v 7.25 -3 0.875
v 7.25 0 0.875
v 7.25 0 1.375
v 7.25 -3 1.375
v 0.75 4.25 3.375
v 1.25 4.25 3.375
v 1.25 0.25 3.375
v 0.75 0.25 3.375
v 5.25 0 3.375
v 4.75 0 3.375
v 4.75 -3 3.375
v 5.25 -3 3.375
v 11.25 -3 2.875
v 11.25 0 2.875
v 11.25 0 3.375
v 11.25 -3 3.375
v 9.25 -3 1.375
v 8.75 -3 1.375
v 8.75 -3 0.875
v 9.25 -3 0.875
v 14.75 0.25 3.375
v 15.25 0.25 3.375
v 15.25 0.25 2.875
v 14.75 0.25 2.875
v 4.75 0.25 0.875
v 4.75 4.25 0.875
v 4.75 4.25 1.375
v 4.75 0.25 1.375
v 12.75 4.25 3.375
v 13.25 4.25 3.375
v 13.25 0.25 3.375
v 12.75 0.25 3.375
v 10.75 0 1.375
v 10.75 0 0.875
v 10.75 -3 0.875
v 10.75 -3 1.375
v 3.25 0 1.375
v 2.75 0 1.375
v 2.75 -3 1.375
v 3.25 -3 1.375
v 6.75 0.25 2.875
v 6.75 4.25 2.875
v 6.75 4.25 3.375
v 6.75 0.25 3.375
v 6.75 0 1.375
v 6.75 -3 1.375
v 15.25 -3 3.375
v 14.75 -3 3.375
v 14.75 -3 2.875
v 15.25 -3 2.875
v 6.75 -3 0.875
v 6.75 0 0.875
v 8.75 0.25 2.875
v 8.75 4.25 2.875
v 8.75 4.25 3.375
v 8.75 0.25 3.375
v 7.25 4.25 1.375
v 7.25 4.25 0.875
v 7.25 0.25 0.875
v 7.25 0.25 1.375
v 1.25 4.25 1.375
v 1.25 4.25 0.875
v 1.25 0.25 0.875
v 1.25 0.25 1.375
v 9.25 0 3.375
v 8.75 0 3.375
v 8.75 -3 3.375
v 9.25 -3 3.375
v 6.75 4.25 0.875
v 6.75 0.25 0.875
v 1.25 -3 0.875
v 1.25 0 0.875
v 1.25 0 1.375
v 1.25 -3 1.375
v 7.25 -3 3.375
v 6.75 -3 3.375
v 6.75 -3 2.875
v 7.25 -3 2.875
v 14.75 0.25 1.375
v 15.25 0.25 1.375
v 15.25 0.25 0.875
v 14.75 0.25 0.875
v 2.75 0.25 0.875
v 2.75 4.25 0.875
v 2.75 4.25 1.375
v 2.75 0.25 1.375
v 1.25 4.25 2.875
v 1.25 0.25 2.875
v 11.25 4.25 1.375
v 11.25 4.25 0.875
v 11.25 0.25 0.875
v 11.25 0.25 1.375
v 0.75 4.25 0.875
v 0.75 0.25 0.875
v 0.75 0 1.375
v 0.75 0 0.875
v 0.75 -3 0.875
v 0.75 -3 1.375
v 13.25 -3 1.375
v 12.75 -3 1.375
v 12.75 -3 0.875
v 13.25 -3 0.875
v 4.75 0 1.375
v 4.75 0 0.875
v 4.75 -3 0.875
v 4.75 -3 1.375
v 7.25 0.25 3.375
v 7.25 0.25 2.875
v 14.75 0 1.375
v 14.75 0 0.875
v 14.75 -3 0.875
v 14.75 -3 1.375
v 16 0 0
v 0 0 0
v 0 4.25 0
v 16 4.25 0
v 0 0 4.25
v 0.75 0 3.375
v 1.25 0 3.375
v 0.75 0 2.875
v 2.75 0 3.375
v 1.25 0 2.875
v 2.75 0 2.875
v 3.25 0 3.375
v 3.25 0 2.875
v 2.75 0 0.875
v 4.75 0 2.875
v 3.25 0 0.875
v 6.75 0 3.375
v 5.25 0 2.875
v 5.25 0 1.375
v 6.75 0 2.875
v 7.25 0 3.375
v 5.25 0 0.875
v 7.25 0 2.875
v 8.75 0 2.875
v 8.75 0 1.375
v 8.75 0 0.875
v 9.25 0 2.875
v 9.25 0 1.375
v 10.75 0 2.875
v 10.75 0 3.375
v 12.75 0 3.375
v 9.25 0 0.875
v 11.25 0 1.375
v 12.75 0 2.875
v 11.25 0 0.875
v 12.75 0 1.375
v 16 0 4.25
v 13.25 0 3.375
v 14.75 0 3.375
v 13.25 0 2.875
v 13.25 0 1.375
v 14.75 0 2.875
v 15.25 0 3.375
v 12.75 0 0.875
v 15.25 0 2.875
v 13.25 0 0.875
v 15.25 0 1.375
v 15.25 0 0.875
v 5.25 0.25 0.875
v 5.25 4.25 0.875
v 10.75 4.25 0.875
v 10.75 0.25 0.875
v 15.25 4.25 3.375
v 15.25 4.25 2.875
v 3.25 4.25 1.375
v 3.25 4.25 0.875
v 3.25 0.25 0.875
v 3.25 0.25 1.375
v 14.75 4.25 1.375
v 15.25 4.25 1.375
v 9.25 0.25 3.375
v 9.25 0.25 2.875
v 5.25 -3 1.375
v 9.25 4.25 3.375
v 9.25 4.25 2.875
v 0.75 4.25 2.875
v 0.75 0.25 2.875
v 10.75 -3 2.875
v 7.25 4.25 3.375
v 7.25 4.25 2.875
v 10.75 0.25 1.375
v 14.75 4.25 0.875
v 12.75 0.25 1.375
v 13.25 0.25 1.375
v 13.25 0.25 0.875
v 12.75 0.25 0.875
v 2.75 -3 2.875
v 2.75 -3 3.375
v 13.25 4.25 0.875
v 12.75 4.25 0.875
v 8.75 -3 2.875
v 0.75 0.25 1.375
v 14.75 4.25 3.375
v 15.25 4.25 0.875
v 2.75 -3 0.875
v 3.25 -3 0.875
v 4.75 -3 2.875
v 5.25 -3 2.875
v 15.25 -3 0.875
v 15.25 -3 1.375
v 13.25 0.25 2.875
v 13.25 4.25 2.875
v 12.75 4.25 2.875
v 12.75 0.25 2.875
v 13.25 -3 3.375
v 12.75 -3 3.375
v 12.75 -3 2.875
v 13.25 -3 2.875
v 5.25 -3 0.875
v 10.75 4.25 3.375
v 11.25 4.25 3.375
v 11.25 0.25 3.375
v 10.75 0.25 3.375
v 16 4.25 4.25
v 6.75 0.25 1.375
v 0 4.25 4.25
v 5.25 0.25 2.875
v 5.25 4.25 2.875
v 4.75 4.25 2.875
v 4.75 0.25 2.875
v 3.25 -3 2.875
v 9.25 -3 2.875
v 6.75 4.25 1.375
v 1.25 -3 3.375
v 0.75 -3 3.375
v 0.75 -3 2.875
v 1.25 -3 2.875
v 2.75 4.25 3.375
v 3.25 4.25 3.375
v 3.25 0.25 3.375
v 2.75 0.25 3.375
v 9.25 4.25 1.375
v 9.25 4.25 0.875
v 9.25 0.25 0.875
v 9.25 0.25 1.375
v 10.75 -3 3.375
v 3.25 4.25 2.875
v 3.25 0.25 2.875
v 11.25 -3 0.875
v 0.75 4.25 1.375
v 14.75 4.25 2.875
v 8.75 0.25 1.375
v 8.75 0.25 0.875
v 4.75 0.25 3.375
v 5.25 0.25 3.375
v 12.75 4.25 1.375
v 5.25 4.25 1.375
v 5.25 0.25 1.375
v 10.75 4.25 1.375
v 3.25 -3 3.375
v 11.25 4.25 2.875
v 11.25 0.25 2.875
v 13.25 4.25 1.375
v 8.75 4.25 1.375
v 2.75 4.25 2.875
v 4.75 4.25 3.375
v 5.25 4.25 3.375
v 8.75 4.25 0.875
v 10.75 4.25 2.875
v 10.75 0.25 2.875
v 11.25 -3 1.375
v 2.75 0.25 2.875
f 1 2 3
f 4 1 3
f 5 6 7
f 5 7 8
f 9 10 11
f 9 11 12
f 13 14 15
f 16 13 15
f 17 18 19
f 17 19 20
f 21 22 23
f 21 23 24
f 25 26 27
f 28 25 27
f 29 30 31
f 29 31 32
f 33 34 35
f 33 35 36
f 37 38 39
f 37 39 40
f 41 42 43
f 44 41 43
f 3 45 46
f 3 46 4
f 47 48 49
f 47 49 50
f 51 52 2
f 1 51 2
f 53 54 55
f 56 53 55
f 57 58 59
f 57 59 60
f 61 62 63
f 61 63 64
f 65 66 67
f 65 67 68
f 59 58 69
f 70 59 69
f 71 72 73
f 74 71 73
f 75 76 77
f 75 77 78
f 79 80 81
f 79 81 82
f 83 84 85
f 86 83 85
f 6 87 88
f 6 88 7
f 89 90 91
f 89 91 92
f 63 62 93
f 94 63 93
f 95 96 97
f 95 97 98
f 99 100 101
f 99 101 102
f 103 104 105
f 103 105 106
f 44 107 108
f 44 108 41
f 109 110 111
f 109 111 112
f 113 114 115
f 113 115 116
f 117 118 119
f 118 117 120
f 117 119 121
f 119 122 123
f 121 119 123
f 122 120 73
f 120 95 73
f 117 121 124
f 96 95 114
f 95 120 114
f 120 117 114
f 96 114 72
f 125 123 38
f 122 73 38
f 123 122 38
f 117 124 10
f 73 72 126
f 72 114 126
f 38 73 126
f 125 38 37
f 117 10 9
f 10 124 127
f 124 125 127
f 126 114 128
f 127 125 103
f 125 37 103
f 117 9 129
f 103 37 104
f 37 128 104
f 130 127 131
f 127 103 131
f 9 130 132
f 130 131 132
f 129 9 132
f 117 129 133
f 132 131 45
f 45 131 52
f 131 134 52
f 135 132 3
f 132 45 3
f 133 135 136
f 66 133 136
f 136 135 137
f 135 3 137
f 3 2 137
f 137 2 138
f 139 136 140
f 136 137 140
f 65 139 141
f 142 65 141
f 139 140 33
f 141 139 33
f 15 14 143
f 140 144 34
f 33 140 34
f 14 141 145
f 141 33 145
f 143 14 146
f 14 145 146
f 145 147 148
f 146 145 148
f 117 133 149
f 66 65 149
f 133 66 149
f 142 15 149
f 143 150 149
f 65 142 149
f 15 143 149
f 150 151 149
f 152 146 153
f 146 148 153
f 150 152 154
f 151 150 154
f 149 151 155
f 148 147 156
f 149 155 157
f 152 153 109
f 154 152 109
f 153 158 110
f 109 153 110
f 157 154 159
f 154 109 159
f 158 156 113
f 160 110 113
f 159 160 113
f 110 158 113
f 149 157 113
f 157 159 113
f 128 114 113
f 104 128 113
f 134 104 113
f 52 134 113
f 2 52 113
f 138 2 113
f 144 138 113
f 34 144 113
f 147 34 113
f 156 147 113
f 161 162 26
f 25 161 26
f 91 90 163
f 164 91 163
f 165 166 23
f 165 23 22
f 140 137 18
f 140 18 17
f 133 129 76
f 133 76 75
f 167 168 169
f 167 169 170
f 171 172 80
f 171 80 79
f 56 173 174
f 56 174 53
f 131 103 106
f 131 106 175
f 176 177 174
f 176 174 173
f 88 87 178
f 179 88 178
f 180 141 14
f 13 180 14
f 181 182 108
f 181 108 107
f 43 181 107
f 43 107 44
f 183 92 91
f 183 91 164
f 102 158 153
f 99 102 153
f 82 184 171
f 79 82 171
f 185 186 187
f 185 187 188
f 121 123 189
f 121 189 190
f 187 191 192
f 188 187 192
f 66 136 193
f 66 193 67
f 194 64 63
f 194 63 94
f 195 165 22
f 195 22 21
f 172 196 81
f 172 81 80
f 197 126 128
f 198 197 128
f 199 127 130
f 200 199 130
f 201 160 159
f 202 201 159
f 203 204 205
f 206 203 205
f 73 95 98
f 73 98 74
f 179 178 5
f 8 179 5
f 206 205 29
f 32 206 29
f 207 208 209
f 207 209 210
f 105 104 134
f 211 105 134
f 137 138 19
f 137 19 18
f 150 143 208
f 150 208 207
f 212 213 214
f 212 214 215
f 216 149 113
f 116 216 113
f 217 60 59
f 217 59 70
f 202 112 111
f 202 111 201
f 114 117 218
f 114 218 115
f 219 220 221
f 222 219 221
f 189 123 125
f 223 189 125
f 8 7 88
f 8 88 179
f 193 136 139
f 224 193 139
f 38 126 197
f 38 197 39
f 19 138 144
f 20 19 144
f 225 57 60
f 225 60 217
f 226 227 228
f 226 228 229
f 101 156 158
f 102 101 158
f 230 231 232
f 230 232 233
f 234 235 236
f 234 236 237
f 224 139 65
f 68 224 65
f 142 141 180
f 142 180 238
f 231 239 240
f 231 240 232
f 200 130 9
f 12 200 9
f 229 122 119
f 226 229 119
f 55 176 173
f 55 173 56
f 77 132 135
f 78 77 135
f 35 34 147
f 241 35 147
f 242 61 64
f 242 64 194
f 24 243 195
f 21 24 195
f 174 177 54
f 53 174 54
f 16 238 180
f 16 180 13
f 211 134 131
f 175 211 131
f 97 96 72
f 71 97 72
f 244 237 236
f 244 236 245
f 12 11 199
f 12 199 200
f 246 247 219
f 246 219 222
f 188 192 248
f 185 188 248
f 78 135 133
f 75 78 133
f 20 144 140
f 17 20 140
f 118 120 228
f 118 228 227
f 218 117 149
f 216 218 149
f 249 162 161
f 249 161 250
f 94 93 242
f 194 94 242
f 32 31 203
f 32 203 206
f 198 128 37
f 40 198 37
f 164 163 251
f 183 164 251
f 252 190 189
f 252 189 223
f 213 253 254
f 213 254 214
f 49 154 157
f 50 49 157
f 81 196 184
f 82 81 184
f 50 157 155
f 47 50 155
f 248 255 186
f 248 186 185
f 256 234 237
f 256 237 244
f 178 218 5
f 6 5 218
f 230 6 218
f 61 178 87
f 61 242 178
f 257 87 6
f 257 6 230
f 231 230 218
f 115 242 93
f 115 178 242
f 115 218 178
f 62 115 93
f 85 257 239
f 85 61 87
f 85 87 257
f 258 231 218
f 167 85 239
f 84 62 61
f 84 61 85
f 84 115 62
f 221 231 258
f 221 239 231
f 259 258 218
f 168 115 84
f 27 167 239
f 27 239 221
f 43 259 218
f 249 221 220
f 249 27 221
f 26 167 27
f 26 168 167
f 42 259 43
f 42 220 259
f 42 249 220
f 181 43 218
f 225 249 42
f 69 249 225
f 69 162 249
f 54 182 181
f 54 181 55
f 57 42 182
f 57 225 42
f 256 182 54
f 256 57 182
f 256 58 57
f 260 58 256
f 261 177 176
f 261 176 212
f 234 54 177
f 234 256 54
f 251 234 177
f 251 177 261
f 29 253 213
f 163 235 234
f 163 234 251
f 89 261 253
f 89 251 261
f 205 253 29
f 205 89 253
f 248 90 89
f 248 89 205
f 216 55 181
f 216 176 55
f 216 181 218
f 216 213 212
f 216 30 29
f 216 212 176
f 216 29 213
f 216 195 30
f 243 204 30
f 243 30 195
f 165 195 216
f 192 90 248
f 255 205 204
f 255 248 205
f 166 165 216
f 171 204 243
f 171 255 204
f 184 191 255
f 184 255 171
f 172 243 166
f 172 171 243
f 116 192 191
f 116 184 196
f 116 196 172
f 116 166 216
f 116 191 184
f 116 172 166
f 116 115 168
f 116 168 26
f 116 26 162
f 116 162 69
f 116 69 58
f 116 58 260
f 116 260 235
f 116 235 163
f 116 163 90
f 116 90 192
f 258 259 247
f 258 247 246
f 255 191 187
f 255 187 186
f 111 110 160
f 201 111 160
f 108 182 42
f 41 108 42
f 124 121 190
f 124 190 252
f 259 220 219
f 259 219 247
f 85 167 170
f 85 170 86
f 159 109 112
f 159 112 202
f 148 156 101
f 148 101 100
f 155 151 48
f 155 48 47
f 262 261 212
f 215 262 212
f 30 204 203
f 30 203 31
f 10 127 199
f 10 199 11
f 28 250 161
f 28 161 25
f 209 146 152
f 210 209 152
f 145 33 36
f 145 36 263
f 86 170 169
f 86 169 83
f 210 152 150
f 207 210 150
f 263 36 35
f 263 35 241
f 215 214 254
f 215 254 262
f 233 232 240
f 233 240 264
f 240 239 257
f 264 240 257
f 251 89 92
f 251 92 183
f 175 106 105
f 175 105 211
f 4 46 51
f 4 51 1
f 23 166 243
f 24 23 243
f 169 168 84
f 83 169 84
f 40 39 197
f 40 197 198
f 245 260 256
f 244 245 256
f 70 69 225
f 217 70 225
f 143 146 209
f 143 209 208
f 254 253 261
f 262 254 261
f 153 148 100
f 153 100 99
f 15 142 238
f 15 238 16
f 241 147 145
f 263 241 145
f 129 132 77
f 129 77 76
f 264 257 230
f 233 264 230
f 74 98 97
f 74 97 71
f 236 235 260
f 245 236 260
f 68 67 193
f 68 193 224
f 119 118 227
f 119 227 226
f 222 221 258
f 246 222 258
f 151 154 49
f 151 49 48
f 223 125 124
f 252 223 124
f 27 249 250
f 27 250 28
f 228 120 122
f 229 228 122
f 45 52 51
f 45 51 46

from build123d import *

# Parameters (mm, degrees)
SKETCH1_W           = 16
SKETCH1_H           = 4.25
BOSS_EXTRUDE1_DEPTH = 4.25
SKETCH3_W           = 0.5
SKETCH3_H           = 0.5
BOSS_EXTRUDE2_DEPTH = 3
SKETCH4_W           = 0.5
SKETCH4_H           = 0.5
CUT_EXTRUDE1_DEPTH  = 4


with BuildPart() as part:
    # Sketch1 → Boss-Extrude1 (new body)
    with BuildSketch(Plane(origin=(0, 0, 0), x_dir=(1, 0, 0), z_dir=(0, 1, 0))):
        with Locations((8, -2.125)):
            Rectangle(SKETCH1_W, SKETCH1_H)
    extrude(amount=BOSS_EXTRUDE1_DEPTH)

    # Sketch3 → Boss-Extrude2 (add)
    with BuildSketch(Plane.XZ):
        with Locations((3, 1.125)):
            Rectangle(SKETCH3_W, SKETCH3_H)
        with Locations((1, 1.125)):
            Rectangle(SKETCH3_W, SKETCH3_H)
        with Locations((5, 1.125)):
            Rectangle(SKETCH3_W, SKETCH3_H)
        with Locations((7, 1.125)):
            Rectangle(SKETCH3_W, SKETCH3_H)
        with Locations((9, 1.125)):
            Rectangle(SKETCH3_W, SKETCH3_H)
        with Locations((11, 1.125)):
            Rectangle(SKETCH3_W, SKETCH3_H)
        with Locations((13, 1.125)):
            Rectangle(SKETCH3_W, SKETCH3_H)
        with Locations((15, 1.125)):
            Rectangle(SKETCH3_W, SKETCH3_H)
        with Locations((1, 3.125)):
            Rectangle(SKETCH3_W, SKETCH3_H)
        with Locations((3, 3.125)):
            Rectangle(SKETCH3_W, SKETCH3_H)
        with Locations((5, 3.125)):
            Rectangle(SKETCH3_W, SKETCH3_H)
        with Locations((7, 3.125)):
            Rectangle(SKETCH3_W, SKETCH3_H)
        with Locations((9, 3.125)):
            Rectangle(SKETCH3_W, SKETCH3_H)
        with Locations((11, 3.125)):
            Rectangle(SKETCH3_W, SKETCH3_H)
        with Locations((13, 3.125)):
            Rectangle(SKETCH3_W, SKETCH3_H)
        with Locations((15, 3.125)):
            Rectangle(SKETCH3_W, SKETCH3_H)
    extrude(amount=BOSS_EXTRUDE2_DEPTH)

    # Sketch4 → Cut-Extrude1 (cut)
    with BuildSketch(Plane(origin=(0, 4.25, 0), x_dir=(-1, 0, 0), z_dir=(0, 1, 0))):
        with Locations((-15, 1.125)):
            Rectangle(SKETCH4_W, SKETCH4_H)
        with Locations((-13, 1.125)):
            Rectangle(SKETCH4_W, SKETCH4_H)
        with Locations((-11, 1.125)):
            Rectangle(SKETCH4_W, SKETCH4_H)
        with Locations((-9, 1.125)):
            Rectangle(SKETCH4_W, SKETCH4_H)
        with Locations((-7, 1.125)):
            Rectangle(SKETCH4_W, SKETCH4_H)
        with Locations((-5, 1.125)):
            Rectangle(SKETCH4_W, SKETCH4_H)
        with Locations((-3, 1.125)):
            Rectangle(SKETCH4_W, SKETCH4_H)
        with Locations((-1, 1.125)):
            Rectangle(SKETCH4_W, SKETCH4_H)
        with Locations((-15, 3.125)):
            Rectangle(SKETCH4_W, SKETCH4_H)
        with Locations((-13, 3.125)):
            Rectangle(SKETCH4_W, SKETCH4_H)
        with Locations((-11, 3.125)):
            Rectangle(SKETCH4_W, SKETCH4_H)
        with Locations((-9, 3.125)):
            Rectangle(SKETCH4_W, SKETCH4_H)
        with Locations((-7, 3.125)):
            Rectangle(SKETCH4_W, SKETCH4_H)
        with Locations((-5, 3.125)):
            Rectangle(SKETCH4_W, SKETCH4_H)
        with Locations((-3, 3.125)):
            Rectangle(SKETCH4_W, SKETCH4_H)
        with Locations((-1, 3.125)):
            Rectangle(SKETCH4_W, SKETCH4_H)
    extrude(amount=-CUT_EXTRUDE1_DEPTH, mode=Mode.SUBTRACT)


solid = part.part
